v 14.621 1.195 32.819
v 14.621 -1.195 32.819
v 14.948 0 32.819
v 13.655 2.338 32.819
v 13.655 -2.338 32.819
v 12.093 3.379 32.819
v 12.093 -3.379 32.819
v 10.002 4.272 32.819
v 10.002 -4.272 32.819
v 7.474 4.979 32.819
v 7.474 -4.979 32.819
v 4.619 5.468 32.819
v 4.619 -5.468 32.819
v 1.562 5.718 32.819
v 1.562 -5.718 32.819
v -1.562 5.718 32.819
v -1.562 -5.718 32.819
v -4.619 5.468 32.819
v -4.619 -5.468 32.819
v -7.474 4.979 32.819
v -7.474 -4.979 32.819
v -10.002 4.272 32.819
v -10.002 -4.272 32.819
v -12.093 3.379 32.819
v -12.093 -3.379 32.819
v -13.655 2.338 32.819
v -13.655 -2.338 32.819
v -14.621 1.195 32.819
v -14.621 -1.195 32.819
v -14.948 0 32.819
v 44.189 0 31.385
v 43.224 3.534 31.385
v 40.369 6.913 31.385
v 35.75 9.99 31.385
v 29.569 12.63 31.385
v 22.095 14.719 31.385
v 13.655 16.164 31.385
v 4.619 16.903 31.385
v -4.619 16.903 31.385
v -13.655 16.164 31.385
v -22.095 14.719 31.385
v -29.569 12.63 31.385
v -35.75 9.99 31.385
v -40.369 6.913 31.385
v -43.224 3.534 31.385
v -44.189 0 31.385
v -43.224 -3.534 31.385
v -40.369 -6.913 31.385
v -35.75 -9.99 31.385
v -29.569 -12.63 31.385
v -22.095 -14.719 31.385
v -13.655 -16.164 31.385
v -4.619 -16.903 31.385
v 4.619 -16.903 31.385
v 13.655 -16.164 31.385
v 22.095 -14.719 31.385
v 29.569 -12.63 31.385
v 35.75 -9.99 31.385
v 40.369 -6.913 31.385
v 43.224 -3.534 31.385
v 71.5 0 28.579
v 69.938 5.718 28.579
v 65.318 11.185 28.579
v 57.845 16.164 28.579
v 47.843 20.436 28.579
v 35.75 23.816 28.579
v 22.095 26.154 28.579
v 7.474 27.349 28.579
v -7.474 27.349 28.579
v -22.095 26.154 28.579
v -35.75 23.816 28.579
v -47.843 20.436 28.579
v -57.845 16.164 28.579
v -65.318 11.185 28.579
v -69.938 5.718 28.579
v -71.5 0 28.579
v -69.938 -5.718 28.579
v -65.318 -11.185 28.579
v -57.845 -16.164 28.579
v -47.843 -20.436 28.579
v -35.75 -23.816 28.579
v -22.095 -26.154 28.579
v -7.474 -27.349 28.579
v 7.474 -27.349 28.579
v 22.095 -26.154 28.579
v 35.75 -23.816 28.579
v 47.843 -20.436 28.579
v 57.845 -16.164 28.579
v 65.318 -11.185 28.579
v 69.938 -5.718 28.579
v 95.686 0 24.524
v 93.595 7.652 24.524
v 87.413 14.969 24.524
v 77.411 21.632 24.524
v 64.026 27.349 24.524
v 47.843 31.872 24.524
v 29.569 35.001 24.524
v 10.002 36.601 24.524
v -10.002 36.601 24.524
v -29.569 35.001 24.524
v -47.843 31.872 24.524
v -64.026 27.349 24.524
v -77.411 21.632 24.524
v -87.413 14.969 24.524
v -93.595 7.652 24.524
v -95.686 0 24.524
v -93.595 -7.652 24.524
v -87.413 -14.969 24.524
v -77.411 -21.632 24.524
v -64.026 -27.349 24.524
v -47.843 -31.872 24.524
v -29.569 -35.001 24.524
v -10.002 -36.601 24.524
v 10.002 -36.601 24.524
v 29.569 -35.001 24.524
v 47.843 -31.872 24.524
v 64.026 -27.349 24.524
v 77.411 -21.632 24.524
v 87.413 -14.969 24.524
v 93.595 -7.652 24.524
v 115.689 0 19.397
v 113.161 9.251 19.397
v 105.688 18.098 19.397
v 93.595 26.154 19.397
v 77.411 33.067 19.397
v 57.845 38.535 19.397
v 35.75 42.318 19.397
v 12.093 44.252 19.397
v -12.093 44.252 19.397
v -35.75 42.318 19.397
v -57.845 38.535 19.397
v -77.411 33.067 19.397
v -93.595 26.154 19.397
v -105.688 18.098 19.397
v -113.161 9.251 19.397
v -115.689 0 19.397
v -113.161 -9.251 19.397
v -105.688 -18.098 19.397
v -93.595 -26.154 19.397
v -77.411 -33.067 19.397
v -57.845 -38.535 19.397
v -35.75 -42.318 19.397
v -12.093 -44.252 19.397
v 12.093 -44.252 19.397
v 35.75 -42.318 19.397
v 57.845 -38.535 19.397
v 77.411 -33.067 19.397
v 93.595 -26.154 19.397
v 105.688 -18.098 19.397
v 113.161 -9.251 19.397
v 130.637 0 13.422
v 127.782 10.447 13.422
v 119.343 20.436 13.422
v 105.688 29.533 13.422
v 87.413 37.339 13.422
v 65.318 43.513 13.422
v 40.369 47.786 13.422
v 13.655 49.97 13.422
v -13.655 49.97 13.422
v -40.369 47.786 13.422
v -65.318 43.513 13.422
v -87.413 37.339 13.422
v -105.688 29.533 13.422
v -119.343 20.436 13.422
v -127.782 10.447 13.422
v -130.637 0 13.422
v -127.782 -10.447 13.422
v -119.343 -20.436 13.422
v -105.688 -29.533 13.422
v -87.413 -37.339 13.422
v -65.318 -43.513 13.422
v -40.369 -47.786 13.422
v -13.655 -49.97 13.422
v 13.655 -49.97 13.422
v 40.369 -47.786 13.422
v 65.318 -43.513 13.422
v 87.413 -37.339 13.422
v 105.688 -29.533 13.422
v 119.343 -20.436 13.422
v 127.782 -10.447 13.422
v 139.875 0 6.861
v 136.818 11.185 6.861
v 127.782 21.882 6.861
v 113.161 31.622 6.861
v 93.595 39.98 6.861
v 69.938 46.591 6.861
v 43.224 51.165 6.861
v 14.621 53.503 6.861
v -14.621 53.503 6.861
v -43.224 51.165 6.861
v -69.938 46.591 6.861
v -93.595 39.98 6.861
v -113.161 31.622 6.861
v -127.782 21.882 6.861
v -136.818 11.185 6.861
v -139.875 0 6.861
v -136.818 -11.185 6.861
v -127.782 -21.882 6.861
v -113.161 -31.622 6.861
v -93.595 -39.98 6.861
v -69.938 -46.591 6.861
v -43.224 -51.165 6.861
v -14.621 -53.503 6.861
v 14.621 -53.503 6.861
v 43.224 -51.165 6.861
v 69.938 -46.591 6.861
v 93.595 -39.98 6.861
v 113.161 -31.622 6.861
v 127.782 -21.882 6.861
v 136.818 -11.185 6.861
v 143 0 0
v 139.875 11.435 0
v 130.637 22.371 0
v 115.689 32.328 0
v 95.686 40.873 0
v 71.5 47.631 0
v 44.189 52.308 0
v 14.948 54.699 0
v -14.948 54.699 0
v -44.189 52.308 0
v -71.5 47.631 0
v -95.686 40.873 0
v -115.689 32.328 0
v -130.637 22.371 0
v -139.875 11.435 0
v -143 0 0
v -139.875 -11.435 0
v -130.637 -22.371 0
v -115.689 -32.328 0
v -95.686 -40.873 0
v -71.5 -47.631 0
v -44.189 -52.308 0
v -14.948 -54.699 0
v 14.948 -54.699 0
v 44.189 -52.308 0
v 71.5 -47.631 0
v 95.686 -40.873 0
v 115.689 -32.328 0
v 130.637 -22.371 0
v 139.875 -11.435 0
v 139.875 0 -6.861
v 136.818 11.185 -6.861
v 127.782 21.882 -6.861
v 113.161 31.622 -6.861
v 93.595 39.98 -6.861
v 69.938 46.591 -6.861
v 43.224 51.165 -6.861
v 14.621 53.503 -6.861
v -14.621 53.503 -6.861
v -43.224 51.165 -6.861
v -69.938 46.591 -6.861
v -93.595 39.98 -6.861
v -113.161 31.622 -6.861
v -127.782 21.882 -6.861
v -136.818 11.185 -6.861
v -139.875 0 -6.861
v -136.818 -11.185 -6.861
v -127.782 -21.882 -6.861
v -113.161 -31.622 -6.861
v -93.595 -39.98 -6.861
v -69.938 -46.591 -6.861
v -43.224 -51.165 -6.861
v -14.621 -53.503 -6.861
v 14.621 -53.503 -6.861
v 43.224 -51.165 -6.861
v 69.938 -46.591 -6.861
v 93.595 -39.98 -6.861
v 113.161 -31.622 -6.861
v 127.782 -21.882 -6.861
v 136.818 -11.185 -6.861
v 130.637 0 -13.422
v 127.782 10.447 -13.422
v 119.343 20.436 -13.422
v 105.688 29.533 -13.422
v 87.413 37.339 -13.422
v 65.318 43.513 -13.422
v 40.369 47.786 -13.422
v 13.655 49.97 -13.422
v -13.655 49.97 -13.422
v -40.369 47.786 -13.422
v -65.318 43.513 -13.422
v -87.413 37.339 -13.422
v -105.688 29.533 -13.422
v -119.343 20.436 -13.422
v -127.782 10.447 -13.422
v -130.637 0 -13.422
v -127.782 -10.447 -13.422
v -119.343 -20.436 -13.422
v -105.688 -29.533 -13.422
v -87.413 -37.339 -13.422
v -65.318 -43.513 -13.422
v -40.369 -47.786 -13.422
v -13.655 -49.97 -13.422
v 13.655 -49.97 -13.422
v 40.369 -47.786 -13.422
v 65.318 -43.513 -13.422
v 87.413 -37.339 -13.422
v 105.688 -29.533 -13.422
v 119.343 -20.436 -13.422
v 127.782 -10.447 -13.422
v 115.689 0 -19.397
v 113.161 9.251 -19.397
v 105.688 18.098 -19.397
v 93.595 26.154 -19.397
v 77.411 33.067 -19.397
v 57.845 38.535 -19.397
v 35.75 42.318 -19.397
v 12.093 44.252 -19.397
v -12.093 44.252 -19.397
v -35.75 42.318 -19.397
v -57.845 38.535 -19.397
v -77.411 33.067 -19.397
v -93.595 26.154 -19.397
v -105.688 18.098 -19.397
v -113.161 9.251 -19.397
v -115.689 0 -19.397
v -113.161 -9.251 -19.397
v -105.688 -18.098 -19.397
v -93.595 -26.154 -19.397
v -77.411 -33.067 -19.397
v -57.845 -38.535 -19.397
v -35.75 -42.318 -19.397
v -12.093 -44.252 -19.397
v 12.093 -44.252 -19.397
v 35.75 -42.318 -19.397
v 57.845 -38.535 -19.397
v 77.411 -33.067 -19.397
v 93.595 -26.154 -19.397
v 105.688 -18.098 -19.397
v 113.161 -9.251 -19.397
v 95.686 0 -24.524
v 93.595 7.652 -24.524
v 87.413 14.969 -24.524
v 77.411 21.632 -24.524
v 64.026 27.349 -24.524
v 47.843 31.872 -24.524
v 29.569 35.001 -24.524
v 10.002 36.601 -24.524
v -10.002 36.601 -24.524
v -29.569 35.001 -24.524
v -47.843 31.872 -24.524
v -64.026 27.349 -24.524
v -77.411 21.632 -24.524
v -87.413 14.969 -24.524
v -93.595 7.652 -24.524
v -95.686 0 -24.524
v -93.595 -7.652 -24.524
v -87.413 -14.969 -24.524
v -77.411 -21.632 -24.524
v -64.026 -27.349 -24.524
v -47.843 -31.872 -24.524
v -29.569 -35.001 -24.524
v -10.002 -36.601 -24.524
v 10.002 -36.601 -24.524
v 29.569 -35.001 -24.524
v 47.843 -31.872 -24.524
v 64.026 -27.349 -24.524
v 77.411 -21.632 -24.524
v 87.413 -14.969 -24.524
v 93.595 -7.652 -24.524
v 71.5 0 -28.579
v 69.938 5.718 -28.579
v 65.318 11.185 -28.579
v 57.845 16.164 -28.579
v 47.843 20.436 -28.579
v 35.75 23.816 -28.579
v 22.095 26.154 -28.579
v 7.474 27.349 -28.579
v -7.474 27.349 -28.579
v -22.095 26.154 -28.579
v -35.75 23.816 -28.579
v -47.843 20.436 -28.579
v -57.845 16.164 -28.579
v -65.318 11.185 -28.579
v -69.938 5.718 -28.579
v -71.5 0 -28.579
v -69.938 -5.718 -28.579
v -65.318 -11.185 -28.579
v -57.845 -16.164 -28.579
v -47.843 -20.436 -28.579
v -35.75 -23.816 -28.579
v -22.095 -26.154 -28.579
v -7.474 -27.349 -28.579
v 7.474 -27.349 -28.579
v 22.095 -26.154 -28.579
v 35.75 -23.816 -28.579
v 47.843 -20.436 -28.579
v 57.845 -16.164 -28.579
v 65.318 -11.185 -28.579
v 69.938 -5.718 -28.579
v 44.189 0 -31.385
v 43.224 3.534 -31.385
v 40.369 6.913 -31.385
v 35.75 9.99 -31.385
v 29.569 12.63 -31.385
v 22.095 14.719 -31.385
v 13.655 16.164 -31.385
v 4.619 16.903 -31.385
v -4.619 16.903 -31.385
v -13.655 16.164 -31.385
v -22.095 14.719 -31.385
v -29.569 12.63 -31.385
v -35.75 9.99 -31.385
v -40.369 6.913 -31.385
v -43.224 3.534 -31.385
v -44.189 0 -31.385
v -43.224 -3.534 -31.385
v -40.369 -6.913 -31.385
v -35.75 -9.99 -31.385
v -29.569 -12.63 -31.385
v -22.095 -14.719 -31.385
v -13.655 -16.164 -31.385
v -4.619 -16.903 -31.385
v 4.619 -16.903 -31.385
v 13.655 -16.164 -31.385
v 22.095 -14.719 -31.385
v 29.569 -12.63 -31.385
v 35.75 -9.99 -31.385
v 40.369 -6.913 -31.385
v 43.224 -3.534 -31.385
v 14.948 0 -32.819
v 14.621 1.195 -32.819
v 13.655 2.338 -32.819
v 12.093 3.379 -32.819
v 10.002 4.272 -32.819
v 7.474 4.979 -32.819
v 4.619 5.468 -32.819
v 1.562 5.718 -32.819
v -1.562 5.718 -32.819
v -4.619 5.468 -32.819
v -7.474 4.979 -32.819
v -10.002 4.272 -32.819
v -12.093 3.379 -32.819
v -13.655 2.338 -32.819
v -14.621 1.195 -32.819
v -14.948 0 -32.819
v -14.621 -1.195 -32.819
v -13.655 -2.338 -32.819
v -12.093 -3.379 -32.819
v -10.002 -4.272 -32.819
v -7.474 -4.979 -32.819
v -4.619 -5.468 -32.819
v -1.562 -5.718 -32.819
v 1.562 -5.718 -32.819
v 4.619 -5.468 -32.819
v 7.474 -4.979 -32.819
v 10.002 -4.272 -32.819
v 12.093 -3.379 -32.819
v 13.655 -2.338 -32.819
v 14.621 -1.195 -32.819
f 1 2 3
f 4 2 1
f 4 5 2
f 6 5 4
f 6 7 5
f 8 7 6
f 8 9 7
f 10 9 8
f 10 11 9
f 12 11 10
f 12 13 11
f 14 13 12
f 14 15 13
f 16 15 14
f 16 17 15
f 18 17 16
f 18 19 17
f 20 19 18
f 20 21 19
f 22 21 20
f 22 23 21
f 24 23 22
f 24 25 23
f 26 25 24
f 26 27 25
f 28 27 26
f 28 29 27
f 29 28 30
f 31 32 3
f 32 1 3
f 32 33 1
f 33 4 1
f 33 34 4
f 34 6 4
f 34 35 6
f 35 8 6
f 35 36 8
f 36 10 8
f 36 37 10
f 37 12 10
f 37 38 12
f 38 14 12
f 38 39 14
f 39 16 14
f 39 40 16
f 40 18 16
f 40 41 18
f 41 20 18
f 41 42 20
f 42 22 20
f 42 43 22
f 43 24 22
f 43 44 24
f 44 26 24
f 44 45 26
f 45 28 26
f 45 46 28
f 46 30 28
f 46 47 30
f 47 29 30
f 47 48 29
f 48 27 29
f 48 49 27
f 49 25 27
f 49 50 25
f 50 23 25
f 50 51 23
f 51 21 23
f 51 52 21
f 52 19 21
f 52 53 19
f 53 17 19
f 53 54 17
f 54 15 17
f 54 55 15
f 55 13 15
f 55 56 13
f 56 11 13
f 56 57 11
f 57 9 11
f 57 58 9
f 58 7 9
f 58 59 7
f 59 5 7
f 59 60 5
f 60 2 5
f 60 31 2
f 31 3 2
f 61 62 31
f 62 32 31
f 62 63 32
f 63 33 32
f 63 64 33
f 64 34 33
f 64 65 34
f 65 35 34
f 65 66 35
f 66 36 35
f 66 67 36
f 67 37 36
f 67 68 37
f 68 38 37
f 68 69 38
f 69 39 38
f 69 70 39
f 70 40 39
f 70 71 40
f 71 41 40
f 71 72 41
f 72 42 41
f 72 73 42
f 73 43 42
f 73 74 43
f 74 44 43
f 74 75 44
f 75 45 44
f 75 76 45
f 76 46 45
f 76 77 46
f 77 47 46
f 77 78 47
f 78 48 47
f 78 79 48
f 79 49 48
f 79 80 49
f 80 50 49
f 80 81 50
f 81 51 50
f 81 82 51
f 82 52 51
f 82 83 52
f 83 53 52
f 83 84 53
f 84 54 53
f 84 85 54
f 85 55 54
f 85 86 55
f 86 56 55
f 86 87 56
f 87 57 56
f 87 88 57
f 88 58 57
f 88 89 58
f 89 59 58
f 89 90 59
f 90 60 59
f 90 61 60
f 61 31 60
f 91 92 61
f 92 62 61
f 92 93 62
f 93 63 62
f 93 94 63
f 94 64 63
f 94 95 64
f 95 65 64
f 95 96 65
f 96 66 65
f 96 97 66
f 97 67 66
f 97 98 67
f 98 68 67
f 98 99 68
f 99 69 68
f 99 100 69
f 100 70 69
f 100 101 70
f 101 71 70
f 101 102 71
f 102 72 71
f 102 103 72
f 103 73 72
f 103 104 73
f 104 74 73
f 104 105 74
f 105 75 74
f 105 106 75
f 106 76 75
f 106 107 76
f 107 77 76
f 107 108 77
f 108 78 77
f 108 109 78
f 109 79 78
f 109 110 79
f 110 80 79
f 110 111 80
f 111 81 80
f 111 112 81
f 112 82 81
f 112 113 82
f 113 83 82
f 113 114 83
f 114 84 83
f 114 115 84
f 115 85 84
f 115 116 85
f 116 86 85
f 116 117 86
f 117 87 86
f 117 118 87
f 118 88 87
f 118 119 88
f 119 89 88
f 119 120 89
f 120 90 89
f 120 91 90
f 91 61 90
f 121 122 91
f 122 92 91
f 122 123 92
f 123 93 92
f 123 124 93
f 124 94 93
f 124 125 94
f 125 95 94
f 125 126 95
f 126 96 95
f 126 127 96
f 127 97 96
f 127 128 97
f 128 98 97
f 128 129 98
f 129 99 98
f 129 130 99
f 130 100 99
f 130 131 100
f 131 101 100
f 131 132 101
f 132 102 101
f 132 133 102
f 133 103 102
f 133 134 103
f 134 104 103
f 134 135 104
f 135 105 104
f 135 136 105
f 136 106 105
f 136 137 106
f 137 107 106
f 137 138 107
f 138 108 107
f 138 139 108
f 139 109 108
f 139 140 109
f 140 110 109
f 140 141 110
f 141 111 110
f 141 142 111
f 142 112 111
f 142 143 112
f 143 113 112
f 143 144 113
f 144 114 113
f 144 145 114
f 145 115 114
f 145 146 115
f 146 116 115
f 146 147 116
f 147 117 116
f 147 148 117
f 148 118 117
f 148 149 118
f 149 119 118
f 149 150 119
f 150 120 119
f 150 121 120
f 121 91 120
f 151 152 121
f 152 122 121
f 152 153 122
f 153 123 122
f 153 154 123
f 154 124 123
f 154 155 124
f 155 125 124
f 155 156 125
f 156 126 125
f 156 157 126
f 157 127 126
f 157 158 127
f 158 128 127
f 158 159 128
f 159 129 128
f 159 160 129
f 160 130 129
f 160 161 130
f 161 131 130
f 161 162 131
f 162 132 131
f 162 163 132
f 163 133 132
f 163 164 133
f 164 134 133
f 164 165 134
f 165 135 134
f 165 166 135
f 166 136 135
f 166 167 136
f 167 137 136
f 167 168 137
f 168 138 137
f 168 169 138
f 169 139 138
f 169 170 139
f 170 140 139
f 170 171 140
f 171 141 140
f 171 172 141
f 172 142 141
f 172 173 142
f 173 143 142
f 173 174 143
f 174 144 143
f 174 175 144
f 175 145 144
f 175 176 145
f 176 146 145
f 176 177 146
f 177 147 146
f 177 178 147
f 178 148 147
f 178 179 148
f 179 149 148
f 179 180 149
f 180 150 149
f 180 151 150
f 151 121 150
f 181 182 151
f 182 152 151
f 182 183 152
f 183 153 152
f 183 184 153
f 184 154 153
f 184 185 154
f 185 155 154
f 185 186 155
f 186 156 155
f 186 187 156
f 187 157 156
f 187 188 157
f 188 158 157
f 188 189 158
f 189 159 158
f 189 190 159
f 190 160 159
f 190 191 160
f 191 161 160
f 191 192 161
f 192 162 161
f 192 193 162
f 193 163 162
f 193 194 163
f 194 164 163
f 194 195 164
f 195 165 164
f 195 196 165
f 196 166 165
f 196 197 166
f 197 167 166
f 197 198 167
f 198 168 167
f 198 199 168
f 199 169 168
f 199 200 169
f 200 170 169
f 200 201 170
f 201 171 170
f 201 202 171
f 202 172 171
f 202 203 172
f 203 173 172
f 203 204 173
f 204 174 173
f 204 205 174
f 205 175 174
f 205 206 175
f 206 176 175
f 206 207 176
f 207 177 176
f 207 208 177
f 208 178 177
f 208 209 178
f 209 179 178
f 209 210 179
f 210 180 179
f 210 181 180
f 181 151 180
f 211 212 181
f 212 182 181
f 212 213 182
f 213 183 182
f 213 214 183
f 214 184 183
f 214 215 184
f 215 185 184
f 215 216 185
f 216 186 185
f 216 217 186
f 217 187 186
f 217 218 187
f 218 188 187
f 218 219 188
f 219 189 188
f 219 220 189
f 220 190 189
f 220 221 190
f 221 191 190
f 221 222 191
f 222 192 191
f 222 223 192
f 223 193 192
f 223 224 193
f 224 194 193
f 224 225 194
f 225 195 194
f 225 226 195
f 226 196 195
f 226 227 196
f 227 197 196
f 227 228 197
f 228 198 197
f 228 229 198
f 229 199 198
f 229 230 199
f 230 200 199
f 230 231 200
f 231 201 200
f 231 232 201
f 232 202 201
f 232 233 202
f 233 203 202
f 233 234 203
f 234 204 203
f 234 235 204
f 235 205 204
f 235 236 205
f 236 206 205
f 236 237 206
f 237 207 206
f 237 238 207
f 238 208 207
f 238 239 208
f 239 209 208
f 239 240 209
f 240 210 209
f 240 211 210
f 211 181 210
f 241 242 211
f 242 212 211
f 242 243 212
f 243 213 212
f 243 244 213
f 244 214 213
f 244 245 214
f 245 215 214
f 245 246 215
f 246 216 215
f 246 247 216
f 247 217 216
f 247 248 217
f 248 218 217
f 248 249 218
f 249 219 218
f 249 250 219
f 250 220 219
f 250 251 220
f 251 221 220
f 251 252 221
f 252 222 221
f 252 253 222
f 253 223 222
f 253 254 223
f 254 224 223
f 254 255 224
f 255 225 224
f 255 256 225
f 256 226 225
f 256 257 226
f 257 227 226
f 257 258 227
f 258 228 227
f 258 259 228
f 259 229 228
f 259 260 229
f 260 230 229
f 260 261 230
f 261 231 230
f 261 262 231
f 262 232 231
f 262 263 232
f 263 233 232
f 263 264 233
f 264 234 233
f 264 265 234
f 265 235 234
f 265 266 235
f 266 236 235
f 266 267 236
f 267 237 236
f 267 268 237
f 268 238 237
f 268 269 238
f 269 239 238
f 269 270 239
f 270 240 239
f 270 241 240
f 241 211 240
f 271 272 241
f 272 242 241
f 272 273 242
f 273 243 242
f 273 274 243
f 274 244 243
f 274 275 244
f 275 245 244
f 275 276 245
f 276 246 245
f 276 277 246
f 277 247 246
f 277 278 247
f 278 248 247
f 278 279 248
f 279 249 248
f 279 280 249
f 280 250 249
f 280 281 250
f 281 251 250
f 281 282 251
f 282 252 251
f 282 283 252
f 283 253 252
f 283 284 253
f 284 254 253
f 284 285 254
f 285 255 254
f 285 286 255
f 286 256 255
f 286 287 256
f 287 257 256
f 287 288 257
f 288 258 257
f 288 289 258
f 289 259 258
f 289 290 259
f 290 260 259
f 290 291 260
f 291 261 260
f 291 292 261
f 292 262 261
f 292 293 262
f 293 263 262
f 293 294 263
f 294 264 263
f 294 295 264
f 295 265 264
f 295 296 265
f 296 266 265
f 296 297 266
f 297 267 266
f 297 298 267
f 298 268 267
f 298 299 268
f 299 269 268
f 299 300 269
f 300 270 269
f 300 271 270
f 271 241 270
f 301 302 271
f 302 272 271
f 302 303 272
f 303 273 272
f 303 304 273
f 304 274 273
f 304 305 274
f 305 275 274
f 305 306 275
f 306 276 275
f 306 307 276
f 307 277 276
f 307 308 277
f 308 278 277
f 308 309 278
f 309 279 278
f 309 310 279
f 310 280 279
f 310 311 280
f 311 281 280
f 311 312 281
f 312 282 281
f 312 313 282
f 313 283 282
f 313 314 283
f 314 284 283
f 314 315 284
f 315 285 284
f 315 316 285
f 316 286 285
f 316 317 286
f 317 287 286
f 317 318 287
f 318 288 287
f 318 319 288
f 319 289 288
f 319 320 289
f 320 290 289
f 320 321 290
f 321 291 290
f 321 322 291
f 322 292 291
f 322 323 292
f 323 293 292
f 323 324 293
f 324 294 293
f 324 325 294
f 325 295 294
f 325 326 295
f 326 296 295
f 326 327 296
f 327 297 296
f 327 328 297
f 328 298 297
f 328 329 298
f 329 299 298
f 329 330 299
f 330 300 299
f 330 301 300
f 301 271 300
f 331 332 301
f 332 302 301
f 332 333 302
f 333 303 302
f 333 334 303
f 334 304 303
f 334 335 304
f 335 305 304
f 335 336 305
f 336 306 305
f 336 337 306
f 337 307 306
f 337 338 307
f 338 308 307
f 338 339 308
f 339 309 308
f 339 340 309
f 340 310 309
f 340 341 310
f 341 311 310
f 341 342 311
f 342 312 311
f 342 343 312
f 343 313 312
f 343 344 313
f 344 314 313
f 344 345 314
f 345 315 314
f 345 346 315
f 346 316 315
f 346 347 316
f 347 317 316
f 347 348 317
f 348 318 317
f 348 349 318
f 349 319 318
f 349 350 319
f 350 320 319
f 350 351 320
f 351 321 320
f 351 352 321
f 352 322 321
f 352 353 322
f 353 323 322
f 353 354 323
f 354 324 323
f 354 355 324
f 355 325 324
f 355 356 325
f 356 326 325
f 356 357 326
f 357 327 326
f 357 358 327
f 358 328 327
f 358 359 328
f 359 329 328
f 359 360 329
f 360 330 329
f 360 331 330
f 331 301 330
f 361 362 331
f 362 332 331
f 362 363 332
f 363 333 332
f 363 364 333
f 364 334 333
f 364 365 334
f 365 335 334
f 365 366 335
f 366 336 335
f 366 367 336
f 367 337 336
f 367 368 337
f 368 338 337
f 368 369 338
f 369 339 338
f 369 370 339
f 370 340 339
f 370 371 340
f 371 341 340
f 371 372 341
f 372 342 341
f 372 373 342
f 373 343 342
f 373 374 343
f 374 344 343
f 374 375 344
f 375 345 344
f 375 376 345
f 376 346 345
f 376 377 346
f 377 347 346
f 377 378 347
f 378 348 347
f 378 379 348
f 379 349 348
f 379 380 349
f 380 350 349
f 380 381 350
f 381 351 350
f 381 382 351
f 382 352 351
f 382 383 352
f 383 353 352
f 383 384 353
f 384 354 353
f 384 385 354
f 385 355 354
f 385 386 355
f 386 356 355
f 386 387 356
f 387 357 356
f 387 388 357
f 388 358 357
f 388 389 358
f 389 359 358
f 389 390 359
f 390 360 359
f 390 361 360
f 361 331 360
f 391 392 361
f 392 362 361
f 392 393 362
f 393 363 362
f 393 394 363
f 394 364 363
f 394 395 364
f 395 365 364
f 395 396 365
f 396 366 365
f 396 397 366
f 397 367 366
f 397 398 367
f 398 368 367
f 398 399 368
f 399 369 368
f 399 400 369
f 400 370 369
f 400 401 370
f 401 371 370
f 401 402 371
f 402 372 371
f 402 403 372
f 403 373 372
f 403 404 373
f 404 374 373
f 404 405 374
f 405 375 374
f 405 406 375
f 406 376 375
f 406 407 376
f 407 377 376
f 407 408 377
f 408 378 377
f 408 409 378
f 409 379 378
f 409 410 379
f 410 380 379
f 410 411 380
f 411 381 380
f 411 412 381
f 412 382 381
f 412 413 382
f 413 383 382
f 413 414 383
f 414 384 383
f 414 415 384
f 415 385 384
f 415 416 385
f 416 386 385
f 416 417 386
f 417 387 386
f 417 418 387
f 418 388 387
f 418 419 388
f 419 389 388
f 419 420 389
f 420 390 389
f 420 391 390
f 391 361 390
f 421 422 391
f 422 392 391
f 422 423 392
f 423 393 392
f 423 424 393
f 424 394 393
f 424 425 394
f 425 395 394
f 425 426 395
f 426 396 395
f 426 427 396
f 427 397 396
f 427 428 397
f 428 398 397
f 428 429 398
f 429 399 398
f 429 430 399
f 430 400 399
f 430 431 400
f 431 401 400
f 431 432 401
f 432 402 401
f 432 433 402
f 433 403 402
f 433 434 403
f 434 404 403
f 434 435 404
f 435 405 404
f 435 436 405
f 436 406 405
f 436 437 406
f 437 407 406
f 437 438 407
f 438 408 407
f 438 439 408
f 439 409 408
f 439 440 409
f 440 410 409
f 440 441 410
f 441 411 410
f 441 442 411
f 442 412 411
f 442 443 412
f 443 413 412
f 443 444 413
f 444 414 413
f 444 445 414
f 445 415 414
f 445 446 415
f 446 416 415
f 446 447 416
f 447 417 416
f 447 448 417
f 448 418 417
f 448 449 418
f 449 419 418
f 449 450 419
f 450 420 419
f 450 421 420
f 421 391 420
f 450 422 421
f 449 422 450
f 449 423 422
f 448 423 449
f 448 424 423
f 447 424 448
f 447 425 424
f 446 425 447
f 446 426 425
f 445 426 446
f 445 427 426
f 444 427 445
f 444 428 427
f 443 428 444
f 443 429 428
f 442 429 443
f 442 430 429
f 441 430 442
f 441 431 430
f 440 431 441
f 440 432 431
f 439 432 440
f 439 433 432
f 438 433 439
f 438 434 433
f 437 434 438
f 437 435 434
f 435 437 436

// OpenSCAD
// Generated by SolidPython 1.0.1 on 2020-07-29 00:46:50


scale(v = [13, 5, 3]) {
	sphere(r = 11);
}
/***********************************************
*********      SolidPython code:      **********
************************************************
 
# import packages: SolidPython
from solid import *
from solid.utils import *
from itertools import chain, combinations, permutations


class Resize:

    def __init__(self, scad_file):
        self.scad_file = scad_file
        #self.scad_file = import_scad(scad_file)
        # cone/cylinder param:
        self.r1 = 0
        self.r2 = 0
        self.h = 0
        # rectangular prism param:
        self.w = 0
        self.l = 0
        # ellipse param:
        self.r = 0

    # import OpenScad code (file name corresponds to shape)


    # classify shape + parameters
    def assign(self, param1, param2, param3):
        if self.scad_file == 'cone.scad':
            self.r1 = param1
            self.r2 = param2
            self.h = param3
        elif self.scad_file == 'cylinder.scad':
            self.r1 = param1
            self.r2 = param2
            self.h = param3
        elif self.scad_file == 'rectangularPrism.scad':
            self.h = param1
            self.l = param2
            self.w = param3
        else:
            self.r = param1
            self.h = param2

    # resize parameters
    def iterate(self):
        x = range(3, 20, 2)
        i = 1
        if self.scad_file == 'cone.scad':
            tempList = list(permutations(x, 2))
            for temp in tempList:
                param1 = temp[0]
                param2 = temp[1]
                filepath = 'produced_scad_files/' + 'cone' + str(param1) + '_' + str(param2) + '_' + '.scad'
                scad_render_to_file(cylinder(h=param1, r1=param2, r2=0), filepath)

        elif self.scad_file == 'cylinder.scad':
            tempList = list(permutations(x, 3))
            for temp in tempList:
                param1 = temp[0]
                param2 = temp[1]
                filepath = 'produced_scad_files/' + 'cylinder' + str(param1) + '_' + str(param2) + '_' + '.scad'
                scad_render_to_file(cylinder(h=param1, r1=param2, r2=param2), filepath)

        elif self.scad_file == 'rectangularPrism.scad':
            tempList = list(permutations(x, 3))
            for temp in tempList:
                param1 = temp[0]
                param2 = temp[1]
                param3 = temp[2]
                filepath = 'produced_scad_files/' + 'rectangularPrism' + str(param1) + '_' + str(param2) + '_' + str(
                    param3) + '.scad'
                scad_render_to_file(cube(size=(param1, param2, param3)), filepath)

        elif self.scad_file == 'ellipse.scad':
            tempList = list(permutations(x, 4))
            for temp in tempList:
                param1 = temp[0]
                param2 = temp[1]
                param3 = temp[2]
                param4 = temp[3]
                filepath = 'produced_scad_files/' + 'ellipse' + str(param1) + '_' + str(param2) + '_' + str(param3) + '_' + str(param4) + '.scad'
                scad_render_to_file(scale([param1, param2, param3])(sphere(r=param4)), filepath)

    def render_to_scadfile(self):
        scad_render_to_file(scad, 'example.scad') 
 
************************************************/
